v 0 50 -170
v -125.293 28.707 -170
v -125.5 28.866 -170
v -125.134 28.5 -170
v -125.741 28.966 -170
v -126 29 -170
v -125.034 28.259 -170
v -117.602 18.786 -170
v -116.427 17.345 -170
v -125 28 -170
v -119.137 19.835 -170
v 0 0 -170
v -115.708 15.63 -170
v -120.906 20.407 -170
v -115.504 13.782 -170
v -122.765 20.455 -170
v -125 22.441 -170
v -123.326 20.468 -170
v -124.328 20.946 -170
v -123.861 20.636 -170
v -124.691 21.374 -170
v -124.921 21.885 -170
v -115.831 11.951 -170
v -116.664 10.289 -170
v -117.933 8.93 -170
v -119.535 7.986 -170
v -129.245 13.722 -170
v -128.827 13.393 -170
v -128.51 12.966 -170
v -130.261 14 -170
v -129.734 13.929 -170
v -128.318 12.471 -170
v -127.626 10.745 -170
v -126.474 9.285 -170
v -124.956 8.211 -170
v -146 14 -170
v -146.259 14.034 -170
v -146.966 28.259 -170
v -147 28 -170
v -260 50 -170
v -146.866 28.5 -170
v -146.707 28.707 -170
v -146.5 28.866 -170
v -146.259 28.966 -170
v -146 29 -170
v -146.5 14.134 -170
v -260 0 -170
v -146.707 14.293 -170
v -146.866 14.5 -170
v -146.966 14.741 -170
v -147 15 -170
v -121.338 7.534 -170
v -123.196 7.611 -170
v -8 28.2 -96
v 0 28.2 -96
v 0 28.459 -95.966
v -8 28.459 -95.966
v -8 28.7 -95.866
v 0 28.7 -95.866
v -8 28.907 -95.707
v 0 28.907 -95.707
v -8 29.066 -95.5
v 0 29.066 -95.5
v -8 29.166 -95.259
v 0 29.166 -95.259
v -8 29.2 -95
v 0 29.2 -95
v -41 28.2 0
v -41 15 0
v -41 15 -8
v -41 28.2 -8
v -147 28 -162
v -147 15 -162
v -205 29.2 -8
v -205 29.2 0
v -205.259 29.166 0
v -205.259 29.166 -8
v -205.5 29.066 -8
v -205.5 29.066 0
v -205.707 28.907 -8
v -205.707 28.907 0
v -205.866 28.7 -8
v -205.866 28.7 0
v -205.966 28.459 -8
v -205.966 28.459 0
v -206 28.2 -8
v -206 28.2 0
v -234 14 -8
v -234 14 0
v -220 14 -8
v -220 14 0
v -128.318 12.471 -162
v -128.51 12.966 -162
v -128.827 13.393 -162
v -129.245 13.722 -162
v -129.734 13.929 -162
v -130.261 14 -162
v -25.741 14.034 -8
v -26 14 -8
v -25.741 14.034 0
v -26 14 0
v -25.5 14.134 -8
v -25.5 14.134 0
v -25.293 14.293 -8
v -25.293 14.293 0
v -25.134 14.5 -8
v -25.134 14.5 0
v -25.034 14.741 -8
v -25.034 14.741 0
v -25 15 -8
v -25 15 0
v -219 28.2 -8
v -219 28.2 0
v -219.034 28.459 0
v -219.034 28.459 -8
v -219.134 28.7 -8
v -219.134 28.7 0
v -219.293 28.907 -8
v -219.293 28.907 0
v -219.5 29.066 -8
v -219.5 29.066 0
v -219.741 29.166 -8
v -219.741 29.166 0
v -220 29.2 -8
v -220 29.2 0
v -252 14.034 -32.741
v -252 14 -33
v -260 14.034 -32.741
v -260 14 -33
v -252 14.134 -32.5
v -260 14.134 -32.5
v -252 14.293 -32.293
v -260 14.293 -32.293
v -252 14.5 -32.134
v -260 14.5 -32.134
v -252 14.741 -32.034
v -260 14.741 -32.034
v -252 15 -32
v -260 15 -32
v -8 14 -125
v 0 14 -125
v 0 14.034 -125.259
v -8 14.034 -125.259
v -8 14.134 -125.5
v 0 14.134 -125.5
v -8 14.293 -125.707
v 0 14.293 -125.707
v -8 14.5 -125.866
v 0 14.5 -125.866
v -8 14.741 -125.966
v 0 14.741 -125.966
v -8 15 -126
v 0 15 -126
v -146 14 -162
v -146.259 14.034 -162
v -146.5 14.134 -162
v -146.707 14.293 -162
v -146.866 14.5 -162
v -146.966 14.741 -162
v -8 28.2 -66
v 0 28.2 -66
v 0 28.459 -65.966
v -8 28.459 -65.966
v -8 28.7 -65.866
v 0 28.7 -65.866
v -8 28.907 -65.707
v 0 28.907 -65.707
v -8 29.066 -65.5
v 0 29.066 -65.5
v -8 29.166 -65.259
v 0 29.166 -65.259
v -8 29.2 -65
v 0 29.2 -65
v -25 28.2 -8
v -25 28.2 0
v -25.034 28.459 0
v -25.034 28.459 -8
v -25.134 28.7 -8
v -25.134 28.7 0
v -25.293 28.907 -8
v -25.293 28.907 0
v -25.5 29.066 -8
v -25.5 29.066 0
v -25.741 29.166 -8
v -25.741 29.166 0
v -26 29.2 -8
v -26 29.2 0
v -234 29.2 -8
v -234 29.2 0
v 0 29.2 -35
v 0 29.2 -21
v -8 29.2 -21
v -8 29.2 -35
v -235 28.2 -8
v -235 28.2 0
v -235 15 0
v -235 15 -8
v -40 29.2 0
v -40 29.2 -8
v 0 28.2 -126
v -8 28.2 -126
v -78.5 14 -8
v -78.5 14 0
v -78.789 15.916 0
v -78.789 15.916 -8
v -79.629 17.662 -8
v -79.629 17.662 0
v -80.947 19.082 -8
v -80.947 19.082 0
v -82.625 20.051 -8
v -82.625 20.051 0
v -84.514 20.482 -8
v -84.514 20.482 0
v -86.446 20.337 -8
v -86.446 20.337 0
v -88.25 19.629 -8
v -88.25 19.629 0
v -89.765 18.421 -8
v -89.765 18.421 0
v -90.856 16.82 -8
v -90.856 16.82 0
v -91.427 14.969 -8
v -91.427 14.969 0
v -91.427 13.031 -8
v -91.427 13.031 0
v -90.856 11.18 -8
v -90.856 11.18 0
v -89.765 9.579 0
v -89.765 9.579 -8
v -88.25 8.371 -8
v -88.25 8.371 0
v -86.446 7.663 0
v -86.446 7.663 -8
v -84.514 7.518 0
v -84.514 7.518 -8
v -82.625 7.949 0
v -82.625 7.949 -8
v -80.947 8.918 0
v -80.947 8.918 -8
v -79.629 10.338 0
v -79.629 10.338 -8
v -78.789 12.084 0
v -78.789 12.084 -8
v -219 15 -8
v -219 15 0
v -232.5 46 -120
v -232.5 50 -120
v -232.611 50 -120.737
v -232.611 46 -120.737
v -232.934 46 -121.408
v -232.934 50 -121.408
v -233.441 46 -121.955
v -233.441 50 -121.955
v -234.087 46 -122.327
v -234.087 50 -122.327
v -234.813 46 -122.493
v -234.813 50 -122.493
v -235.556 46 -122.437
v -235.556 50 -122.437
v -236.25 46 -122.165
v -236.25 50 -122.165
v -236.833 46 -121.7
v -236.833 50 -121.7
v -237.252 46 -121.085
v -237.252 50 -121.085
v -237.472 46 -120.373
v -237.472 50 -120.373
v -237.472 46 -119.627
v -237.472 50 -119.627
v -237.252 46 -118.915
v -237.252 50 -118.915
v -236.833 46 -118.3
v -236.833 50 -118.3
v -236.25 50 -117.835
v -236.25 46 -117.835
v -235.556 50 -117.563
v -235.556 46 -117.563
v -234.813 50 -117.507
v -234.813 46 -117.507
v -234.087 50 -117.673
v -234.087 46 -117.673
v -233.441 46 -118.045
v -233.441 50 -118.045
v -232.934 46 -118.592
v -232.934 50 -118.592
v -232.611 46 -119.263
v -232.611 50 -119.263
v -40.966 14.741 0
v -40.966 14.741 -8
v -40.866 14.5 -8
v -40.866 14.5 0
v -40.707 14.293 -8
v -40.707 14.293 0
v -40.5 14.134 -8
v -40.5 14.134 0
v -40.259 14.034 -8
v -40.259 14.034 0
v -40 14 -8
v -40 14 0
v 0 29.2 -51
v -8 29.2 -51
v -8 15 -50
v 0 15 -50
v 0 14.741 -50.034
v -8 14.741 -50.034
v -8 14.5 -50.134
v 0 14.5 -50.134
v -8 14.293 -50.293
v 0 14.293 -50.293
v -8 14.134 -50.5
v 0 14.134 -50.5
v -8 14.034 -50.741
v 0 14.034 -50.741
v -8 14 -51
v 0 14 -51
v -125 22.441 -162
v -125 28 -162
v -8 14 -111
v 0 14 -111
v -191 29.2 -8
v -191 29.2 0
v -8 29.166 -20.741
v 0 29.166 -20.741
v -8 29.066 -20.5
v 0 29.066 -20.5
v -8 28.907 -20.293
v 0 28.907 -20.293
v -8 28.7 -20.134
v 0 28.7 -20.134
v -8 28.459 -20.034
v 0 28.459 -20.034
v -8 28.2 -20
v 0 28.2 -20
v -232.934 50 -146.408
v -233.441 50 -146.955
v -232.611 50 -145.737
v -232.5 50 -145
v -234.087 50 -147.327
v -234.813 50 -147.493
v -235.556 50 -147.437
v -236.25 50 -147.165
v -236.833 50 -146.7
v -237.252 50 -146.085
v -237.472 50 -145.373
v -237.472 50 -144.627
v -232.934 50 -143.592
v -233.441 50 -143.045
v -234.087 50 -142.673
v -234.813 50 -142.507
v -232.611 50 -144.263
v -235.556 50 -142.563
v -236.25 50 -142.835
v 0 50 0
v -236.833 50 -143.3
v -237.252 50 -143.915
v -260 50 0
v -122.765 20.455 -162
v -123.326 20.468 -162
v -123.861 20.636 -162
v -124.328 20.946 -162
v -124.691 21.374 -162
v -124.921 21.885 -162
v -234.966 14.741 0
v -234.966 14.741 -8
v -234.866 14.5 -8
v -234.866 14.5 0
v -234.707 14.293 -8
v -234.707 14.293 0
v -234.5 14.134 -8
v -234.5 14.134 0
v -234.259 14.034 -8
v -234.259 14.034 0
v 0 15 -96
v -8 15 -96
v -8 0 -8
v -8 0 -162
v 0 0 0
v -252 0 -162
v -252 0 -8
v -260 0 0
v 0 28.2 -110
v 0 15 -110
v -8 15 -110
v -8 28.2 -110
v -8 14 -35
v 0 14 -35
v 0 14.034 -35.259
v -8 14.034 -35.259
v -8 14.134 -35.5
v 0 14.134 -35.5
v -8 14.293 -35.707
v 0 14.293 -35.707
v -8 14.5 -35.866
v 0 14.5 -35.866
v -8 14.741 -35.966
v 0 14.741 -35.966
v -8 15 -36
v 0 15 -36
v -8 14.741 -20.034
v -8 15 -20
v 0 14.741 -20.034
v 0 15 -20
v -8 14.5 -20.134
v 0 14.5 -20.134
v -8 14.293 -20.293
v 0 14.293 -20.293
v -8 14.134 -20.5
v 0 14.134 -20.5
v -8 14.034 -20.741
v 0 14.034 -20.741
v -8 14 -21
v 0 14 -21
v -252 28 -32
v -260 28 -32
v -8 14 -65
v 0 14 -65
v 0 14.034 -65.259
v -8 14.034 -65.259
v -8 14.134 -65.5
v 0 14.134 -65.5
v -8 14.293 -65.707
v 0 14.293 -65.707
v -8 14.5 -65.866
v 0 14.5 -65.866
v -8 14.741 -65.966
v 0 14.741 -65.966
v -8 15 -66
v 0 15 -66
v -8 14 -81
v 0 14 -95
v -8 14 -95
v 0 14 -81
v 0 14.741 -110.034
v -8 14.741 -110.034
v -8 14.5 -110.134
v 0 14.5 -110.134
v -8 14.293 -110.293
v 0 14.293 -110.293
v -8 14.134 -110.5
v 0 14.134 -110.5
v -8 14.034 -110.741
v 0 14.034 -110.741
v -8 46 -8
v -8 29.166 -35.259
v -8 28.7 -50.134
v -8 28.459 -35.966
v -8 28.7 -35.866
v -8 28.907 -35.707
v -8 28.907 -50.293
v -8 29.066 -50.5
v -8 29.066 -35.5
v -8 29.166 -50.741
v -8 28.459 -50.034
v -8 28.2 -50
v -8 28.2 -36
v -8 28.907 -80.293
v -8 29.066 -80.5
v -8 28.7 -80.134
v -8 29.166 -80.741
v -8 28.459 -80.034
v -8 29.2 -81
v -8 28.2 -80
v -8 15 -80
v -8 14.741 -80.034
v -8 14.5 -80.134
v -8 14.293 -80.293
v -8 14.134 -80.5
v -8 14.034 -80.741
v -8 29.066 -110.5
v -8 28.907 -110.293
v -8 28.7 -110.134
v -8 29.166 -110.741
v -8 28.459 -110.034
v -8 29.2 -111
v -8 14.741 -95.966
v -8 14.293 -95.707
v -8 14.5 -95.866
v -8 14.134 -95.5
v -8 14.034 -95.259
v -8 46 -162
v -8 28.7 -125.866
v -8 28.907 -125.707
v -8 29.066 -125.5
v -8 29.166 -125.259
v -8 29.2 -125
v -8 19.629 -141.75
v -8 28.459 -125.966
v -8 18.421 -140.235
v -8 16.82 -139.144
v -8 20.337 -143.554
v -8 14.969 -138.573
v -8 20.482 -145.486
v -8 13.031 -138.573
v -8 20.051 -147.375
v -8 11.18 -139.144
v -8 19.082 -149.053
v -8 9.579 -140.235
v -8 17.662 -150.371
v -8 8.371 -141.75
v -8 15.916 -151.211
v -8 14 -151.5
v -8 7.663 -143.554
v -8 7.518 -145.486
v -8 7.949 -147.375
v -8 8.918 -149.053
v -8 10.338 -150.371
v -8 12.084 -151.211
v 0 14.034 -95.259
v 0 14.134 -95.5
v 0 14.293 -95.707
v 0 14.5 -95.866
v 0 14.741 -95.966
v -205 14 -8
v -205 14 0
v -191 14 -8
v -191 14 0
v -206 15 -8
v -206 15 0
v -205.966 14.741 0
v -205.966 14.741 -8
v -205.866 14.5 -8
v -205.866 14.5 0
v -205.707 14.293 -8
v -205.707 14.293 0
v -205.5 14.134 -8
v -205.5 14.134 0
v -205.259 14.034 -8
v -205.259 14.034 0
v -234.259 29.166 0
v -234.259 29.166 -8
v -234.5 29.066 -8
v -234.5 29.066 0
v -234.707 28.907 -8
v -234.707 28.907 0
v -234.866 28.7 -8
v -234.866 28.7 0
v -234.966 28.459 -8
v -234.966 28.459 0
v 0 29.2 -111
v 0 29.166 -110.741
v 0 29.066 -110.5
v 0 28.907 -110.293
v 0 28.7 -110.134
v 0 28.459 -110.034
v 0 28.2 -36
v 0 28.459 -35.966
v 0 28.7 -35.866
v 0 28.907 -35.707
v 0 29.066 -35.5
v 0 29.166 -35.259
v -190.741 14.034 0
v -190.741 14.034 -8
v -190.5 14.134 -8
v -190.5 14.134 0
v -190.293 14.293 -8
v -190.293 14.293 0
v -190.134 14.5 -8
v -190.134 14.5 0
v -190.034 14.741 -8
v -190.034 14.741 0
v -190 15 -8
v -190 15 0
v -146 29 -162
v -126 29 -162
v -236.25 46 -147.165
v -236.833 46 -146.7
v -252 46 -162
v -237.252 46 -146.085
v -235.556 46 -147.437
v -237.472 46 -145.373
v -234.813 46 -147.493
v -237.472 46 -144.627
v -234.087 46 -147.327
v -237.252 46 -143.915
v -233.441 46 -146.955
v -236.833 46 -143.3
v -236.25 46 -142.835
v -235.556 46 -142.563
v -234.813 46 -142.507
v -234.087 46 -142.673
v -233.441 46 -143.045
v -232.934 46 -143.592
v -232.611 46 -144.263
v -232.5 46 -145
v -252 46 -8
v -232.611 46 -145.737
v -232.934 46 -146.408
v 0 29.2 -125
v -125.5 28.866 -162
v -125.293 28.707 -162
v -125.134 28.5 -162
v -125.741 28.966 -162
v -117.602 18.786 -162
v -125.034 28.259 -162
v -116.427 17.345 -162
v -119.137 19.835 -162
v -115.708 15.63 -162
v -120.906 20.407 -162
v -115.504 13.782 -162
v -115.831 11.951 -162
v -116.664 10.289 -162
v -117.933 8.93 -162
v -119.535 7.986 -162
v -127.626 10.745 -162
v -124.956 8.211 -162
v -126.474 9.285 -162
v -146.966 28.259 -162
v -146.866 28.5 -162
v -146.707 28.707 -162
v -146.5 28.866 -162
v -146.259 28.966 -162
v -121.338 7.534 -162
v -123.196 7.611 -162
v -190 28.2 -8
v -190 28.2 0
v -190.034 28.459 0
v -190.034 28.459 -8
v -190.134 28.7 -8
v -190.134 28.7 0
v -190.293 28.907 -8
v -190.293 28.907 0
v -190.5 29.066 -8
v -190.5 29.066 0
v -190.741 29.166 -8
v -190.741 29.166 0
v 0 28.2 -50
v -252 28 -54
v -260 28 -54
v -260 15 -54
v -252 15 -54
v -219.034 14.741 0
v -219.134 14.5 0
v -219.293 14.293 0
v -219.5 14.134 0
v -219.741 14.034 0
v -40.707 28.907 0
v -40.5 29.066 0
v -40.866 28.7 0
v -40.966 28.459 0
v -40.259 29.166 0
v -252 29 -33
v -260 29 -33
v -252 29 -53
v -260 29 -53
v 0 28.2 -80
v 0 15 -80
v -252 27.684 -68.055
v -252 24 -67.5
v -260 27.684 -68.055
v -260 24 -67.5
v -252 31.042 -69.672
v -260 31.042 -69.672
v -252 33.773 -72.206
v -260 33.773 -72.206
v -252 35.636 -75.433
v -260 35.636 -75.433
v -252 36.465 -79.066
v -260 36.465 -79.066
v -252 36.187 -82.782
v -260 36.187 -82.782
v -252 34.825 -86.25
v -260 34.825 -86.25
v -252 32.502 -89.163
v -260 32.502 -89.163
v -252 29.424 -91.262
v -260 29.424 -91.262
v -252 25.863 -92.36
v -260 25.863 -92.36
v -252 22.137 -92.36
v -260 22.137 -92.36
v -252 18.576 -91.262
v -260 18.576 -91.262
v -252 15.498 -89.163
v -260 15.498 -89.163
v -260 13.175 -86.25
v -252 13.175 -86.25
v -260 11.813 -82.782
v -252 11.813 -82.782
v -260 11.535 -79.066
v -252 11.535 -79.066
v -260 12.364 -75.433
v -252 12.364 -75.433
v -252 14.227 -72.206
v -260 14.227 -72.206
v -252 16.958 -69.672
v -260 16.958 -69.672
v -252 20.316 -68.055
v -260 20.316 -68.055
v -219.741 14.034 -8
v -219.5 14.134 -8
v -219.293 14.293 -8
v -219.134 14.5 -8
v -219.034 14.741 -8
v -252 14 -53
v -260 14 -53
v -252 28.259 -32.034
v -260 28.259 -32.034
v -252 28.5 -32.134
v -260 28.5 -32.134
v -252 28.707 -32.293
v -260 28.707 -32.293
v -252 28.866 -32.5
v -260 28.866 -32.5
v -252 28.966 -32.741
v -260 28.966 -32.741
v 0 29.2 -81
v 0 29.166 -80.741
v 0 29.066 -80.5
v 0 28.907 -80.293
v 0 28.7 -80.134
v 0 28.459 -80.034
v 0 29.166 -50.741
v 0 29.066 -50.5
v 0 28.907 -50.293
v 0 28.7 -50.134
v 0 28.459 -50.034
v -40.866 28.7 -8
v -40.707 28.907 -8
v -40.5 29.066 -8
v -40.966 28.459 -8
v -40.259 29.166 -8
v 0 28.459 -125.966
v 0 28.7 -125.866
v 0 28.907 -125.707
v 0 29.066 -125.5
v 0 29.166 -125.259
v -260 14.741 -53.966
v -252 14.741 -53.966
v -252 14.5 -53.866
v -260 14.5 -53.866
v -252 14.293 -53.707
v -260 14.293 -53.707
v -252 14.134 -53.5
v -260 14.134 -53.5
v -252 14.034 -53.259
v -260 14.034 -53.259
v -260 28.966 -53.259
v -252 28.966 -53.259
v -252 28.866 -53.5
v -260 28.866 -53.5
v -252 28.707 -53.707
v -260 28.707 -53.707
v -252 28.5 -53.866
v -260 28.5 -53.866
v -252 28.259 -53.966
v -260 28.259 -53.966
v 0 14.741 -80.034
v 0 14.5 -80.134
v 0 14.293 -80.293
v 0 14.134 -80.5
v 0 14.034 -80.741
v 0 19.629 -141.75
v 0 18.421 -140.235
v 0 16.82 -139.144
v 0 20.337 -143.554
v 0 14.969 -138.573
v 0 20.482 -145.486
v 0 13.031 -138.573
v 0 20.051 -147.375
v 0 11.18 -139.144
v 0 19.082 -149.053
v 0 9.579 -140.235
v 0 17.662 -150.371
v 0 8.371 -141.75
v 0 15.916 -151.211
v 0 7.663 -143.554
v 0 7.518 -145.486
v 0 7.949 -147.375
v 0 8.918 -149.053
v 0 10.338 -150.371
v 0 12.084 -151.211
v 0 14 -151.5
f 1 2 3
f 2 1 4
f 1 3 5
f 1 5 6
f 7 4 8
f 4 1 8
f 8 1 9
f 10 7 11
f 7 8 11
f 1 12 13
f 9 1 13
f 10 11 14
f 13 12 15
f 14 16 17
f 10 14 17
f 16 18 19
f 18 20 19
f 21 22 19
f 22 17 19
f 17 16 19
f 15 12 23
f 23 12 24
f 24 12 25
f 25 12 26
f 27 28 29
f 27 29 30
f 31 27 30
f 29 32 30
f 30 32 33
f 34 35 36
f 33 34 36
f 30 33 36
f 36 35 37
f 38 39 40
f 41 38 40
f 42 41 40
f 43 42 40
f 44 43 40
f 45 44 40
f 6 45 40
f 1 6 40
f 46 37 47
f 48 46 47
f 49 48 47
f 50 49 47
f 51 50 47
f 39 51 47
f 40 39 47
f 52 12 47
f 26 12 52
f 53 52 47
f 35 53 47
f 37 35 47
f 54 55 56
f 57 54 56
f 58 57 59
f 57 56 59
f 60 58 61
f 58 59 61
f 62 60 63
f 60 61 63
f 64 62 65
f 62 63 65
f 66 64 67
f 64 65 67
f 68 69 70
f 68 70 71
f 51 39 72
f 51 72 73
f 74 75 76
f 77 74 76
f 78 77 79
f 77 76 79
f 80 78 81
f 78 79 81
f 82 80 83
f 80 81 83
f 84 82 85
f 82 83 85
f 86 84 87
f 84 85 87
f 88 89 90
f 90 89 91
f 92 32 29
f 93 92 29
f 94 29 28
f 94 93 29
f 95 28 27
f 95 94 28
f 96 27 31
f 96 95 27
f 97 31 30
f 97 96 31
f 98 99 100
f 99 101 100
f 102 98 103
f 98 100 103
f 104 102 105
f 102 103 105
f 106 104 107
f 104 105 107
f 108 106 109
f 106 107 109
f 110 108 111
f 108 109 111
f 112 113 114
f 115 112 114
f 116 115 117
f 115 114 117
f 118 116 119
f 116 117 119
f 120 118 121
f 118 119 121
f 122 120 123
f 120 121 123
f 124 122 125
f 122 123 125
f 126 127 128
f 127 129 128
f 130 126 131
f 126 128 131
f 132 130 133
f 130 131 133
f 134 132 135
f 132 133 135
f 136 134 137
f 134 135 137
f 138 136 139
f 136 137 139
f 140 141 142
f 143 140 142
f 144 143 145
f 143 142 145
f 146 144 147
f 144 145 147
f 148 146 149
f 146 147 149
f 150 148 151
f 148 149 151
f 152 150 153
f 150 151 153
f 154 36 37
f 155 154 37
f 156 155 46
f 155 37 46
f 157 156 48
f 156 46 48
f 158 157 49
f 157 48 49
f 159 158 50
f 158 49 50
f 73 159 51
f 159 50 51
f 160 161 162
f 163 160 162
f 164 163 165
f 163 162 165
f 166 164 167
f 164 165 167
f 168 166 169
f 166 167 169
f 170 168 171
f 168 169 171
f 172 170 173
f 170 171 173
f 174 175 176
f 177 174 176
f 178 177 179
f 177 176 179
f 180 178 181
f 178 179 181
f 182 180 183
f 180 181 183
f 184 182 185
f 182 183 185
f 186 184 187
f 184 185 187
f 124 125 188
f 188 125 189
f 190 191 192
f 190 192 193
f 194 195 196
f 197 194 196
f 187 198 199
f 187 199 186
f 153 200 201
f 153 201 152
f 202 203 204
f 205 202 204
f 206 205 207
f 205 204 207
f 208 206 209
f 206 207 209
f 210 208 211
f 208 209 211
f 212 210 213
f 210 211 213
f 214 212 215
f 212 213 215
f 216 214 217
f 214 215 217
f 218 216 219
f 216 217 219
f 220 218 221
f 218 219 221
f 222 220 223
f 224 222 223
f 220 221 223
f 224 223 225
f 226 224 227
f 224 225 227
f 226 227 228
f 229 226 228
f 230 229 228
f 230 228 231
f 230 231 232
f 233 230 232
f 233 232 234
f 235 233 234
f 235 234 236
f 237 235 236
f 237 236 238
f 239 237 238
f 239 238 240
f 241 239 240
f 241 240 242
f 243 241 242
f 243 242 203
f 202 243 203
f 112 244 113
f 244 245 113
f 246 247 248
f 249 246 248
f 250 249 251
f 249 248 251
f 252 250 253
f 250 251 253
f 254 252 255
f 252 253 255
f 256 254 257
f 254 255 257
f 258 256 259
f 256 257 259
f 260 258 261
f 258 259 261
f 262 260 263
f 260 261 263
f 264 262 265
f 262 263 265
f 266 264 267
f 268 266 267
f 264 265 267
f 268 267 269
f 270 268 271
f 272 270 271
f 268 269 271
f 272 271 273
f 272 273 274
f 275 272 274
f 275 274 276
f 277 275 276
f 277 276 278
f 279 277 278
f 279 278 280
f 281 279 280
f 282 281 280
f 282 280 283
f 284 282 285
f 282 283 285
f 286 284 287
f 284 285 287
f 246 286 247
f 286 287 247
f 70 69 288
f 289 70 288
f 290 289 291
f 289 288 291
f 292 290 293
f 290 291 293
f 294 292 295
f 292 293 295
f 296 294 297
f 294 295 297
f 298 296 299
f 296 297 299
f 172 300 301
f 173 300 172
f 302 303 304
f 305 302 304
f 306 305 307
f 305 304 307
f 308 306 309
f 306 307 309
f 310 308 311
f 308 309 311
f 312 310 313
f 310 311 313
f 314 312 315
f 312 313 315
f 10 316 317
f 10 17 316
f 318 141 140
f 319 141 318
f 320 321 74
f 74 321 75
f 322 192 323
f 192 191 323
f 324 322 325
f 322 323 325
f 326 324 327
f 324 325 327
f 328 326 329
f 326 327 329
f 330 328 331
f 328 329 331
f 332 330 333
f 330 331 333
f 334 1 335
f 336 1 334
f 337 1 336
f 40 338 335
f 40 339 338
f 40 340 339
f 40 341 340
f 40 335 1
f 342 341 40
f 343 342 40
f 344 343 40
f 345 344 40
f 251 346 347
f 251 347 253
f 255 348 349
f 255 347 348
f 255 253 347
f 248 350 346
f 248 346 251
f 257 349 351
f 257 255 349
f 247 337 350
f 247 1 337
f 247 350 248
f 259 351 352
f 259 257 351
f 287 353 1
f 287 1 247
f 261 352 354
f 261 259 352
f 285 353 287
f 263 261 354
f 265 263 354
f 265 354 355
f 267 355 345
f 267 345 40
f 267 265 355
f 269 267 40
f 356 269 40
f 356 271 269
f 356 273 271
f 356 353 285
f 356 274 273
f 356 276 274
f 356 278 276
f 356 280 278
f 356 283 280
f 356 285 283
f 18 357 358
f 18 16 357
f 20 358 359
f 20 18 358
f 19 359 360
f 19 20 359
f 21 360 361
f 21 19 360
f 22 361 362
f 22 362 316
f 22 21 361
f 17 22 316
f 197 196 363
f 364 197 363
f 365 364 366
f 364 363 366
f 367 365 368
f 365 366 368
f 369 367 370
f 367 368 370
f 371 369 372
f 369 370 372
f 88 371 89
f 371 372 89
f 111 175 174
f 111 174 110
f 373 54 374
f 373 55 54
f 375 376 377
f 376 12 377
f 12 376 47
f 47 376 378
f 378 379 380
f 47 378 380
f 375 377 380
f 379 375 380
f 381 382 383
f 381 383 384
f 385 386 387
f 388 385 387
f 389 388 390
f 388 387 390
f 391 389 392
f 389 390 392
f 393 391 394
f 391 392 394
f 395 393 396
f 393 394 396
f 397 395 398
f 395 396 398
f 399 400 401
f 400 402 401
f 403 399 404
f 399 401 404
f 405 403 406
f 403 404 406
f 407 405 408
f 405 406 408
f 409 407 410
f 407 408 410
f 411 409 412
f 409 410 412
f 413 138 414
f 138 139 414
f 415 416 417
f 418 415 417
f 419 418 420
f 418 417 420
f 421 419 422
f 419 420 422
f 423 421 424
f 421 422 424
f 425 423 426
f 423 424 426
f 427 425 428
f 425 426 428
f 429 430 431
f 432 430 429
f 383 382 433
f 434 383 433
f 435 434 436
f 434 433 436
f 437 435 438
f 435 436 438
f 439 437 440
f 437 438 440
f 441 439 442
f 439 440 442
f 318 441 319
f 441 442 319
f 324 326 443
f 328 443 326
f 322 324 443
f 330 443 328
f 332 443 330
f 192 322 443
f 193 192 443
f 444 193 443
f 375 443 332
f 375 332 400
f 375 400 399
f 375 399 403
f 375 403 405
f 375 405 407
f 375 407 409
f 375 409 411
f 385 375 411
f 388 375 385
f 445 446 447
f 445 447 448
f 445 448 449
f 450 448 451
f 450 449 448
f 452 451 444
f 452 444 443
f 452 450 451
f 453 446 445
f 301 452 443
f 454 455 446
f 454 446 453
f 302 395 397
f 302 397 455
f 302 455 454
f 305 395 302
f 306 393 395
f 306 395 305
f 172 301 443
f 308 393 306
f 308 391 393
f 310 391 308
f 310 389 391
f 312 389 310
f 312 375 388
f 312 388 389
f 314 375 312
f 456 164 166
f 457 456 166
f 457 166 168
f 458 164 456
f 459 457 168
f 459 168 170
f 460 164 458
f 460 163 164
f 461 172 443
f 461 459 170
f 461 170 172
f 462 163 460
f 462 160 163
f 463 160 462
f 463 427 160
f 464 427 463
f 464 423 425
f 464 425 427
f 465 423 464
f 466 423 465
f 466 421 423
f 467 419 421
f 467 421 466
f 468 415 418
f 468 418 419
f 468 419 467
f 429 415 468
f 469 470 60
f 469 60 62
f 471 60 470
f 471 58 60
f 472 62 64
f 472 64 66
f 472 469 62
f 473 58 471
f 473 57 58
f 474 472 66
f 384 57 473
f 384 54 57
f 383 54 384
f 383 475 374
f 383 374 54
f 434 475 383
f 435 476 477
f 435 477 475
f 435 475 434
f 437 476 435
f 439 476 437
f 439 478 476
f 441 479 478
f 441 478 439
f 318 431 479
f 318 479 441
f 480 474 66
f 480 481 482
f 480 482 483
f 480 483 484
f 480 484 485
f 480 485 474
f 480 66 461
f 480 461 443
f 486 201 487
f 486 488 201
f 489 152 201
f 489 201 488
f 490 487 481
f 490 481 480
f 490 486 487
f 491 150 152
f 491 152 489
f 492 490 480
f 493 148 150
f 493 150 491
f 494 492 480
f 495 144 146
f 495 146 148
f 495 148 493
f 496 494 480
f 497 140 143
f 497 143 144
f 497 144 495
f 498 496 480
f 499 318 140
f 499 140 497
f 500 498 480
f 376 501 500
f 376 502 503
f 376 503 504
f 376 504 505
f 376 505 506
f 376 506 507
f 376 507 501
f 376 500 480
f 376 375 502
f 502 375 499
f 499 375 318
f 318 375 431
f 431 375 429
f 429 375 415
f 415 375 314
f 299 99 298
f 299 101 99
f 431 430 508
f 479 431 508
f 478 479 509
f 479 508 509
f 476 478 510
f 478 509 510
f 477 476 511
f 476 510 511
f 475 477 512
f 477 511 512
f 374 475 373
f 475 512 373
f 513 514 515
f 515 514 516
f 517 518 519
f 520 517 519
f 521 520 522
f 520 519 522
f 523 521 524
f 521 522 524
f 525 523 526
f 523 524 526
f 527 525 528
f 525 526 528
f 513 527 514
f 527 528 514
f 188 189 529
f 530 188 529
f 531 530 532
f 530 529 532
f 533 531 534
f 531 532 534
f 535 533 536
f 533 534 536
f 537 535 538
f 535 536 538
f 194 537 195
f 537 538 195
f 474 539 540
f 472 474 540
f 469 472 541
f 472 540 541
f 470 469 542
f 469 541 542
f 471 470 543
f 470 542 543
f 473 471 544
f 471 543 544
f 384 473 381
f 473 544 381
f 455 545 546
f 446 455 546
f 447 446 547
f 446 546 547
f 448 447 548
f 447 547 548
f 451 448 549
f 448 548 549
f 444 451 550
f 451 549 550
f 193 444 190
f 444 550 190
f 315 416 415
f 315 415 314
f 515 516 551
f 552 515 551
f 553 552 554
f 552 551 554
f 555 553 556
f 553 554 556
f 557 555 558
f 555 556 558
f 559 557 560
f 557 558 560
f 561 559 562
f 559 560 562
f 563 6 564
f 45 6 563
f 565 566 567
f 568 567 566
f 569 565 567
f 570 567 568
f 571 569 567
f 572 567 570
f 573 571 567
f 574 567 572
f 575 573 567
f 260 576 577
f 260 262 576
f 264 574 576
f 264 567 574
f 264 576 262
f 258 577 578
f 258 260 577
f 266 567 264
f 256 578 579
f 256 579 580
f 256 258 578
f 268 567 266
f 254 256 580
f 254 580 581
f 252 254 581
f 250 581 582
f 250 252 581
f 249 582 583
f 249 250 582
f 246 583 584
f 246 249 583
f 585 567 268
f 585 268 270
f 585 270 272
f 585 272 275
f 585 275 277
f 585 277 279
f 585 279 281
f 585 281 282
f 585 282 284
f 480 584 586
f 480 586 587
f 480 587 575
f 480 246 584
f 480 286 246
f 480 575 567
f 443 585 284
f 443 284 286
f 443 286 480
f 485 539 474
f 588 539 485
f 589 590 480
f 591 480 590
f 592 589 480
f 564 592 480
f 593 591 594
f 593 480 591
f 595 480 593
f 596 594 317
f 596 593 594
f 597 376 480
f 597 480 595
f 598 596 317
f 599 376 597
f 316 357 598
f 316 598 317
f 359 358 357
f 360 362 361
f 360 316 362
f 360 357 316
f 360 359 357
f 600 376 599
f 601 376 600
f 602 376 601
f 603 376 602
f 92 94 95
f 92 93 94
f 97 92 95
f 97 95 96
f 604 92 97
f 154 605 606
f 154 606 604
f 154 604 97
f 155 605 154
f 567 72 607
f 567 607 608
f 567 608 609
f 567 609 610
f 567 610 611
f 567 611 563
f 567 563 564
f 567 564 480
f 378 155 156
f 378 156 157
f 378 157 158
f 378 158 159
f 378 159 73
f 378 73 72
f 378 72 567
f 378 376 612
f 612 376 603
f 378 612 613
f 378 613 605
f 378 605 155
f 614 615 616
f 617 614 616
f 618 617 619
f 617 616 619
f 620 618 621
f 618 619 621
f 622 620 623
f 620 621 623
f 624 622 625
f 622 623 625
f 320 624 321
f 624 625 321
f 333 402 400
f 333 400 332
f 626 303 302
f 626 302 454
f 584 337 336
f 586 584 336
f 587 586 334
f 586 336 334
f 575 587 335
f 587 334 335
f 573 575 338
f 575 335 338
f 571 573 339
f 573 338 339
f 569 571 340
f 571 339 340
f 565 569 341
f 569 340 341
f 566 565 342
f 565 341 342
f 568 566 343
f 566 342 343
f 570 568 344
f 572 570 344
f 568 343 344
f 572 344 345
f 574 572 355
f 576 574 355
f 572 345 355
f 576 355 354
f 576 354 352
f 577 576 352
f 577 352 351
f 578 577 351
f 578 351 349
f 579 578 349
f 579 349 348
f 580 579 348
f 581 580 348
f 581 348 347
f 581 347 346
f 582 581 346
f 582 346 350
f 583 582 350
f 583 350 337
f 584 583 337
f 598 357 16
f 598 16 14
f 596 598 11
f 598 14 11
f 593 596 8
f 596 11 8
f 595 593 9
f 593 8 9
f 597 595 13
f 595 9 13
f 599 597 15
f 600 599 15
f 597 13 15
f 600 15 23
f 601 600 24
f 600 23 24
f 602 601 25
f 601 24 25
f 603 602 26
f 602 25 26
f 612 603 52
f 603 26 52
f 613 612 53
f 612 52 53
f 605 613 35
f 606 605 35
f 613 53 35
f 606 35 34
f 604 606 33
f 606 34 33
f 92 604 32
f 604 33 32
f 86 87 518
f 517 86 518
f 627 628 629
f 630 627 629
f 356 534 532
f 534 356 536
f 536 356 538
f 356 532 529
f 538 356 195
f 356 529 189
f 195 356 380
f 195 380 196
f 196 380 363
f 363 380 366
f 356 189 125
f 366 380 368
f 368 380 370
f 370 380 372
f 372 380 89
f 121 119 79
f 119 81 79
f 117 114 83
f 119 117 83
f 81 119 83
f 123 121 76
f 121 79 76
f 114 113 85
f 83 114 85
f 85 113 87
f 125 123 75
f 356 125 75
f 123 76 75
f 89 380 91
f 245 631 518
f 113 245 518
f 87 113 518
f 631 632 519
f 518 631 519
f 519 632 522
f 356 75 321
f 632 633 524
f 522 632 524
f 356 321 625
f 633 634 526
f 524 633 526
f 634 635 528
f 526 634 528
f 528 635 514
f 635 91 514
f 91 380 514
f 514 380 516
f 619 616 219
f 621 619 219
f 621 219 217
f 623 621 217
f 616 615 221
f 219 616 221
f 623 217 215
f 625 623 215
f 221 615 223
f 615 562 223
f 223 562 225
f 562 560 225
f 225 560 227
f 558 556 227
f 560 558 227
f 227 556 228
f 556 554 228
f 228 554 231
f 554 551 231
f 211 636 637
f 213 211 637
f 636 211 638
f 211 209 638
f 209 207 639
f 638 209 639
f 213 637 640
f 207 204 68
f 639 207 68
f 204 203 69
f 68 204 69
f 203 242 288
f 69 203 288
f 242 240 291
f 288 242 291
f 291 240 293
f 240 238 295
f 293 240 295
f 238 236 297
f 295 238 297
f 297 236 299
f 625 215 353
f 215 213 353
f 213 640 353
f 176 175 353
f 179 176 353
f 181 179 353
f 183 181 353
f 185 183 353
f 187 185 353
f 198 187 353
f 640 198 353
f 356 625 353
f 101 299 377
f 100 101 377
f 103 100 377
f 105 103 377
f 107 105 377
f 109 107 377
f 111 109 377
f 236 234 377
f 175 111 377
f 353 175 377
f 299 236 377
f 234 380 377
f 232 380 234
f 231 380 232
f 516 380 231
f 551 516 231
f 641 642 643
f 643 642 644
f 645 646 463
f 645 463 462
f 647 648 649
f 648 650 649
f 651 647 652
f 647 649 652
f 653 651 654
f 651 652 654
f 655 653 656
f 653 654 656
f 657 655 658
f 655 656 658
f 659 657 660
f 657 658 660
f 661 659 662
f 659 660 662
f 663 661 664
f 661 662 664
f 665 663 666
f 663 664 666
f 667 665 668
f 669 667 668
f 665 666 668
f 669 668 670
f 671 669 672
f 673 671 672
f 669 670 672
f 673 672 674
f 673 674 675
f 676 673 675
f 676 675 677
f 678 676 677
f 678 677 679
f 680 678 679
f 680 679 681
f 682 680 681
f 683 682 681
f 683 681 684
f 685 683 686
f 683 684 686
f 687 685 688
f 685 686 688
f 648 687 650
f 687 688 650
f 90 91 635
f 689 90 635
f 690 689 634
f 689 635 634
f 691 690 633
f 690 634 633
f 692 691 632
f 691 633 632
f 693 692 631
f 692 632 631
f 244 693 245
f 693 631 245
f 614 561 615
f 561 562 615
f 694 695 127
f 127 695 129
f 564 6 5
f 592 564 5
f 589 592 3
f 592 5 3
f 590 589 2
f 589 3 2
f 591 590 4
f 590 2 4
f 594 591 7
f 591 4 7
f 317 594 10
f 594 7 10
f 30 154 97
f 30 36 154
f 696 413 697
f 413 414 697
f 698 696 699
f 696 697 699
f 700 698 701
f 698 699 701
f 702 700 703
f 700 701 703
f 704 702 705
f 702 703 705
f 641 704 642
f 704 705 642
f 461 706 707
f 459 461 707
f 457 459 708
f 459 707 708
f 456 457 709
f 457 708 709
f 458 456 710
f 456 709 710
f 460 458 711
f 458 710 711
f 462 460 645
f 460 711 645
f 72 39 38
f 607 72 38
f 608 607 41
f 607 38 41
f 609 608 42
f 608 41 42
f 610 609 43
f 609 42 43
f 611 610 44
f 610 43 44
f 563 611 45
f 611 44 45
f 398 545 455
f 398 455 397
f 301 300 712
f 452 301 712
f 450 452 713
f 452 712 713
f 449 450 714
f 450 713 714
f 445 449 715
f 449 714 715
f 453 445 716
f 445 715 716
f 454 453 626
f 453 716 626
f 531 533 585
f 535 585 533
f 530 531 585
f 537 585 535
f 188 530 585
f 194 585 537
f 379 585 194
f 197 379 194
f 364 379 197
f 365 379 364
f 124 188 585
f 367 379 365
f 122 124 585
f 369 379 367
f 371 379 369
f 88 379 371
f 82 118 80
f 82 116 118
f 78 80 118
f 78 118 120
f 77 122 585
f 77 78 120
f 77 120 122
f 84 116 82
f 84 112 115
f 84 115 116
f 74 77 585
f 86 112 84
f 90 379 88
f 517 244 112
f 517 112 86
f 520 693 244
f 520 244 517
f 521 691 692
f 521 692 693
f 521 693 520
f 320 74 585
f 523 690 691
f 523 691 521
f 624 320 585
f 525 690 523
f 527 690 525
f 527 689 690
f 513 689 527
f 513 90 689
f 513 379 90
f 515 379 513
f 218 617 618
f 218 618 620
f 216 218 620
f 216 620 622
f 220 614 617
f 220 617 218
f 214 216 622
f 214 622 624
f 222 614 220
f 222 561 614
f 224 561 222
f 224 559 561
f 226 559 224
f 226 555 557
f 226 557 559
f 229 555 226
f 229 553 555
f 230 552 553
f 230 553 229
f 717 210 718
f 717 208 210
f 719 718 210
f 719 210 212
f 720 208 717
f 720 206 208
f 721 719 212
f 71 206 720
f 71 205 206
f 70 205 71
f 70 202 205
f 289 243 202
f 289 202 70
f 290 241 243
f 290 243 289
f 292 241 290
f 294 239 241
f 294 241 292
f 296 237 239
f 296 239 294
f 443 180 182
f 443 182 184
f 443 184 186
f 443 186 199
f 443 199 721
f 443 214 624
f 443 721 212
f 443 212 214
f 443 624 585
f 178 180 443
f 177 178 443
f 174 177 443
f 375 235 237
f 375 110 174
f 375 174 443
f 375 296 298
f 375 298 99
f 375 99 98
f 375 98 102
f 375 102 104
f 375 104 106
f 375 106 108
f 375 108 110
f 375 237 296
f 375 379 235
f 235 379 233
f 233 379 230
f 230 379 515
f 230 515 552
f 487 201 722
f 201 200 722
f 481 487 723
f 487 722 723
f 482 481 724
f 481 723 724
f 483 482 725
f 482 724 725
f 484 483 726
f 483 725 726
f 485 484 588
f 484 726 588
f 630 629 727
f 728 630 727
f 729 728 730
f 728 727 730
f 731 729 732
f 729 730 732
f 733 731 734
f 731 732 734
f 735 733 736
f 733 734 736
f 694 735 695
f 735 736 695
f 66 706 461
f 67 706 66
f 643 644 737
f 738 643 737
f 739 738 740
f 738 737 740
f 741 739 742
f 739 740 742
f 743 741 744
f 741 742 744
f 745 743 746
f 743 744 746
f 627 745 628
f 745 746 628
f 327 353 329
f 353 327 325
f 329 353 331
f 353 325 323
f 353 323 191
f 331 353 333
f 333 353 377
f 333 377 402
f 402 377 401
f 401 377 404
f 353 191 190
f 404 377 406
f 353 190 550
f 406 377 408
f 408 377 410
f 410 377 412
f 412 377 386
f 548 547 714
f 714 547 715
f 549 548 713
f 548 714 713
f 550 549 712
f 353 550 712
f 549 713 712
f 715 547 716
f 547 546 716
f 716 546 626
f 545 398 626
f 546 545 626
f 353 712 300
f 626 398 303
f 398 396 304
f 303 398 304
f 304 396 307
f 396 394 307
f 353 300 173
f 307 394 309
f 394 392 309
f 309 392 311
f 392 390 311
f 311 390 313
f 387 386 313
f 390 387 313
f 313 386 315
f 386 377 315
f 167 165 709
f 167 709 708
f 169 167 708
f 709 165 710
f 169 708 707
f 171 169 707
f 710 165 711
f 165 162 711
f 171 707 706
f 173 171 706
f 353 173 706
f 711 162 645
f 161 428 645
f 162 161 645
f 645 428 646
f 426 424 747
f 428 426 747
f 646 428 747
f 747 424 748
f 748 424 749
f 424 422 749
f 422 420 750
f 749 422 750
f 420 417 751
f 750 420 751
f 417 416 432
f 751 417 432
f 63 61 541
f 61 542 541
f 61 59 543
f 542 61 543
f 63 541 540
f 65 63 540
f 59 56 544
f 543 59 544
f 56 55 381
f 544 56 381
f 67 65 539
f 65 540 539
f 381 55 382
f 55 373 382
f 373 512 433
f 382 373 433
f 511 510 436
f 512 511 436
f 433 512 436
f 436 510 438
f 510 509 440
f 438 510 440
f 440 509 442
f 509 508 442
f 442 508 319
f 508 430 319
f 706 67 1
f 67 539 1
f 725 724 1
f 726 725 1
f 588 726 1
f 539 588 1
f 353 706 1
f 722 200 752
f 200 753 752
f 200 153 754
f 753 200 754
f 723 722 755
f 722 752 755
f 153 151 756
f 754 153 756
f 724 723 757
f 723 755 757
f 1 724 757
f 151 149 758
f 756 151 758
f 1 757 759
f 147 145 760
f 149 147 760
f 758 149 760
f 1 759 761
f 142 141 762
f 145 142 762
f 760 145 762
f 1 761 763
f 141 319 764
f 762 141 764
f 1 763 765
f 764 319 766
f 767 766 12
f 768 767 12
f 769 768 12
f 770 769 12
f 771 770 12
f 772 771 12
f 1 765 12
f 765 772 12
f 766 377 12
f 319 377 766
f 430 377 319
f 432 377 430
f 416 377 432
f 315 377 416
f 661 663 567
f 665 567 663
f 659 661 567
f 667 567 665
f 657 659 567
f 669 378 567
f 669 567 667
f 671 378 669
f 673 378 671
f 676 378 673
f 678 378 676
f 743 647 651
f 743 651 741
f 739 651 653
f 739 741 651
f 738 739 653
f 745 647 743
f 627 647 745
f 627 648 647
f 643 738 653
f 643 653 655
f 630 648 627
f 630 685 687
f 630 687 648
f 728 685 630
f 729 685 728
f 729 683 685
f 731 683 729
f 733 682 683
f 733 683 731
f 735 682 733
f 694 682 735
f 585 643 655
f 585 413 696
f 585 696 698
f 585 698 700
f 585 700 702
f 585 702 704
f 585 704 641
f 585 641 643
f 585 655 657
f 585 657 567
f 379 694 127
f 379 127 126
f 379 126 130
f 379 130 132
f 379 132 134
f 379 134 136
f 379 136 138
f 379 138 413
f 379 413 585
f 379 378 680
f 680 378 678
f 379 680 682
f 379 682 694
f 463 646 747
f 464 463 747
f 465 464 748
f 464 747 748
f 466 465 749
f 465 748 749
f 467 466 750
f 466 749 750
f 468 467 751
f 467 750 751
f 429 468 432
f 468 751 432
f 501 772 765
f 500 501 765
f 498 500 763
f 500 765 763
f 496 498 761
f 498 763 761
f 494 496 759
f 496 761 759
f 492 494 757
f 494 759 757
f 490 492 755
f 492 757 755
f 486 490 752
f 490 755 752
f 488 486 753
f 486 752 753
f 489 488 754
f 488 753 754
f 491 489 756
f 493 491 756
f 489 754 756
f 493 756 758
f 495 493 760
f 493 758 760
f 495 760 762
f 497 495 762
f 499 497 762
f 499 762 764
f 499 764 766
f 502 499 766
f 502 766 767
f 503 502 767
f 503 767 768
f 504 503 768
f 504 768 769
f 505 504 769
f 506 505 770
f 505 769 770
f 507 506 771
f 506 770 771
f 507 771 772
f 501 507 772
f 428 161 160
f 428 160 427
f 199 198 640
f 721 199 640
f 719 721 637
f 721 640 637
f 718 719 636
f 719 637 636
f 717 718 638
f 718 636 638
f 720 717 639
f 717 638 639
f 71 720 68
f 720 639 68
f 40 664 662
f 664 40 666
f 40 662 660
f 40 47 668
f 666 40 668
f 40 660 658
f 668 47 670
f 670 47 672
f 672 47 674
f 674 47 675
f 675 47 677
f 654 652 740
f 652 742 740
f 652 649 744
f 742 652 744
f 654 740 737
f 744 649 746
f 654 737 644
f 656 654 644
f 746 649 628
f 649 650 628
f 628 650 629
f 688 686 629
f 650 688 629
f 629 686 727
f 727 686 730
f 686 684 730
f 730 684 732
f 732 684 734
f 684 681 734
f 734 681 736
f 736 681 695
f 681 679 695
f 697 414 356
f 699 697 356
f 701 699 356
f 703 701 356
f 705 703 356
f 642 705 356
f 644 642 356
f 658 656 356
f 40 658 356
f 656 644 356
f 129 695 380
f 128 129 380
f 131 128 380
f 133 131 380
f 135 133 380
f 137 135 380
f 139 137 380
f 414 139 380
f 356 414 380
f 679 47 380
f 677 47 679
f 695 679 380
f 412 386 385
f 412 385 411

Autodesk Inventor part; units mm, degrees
ref_plane "YZ Plane" through (0, 0, 0) normal (1, 0, 0) x (0, 1, 0)
ref_plane "XZ Plane" through (0, 0, 0) normal (0, 1, 0) x (-1, 0, 0)
ref_plane "XY Plane" through (0, 0, 0) normal (0, 0, 1) x (1, 0, 0)
sketch "Sketch1" plane through (0, 0, 0) normal (0, 1, 0) x (-1, 0, 0)
  line L0 (0, -170) -> (260, -170)
  line L1 (260, -170) -> (260, 0)
  line L2 (260, 0) -> (0, 0)
  line L3 (0, 0) -> (0, -170)
  dimension "d2" = 260
  dimension "d3" = 170
extrude "Box" add sketch "Sketch1" along normal blind 50
sketch "Sketch2" plane through (0, 0, 0) normal (1, 0, 0) x (0, 0, -1)
  line L0 (35, 14) -> (21, 14)
  line L1 (20, 15) -> (20, 28.2)
  line L2 (21, 29.2) -> (35, 29.2)
  line L3 (36, 28.2) -> (36, 15)
  arc A0 (21, 29.2) -> (20, 28.2) centre (21, 28.2) ccw
  arc A1 (36, 28.2) -> (35, 29.2) centre (35, 28.2) ccw
  arc A2 (35, 14) -> (36, 15) centre (35, 15) ccw
  arc A3 (20, 15) -> (21, 14) centre (21, 15) ccw
  line L4 (65, 14) -> (51, 14)
  line L5 (50, 15) -> (50, 28.2)
  line L6 (51, 29.2) -> (65, 29.2)
  line L7 (66, 28.2) -> (66, 15)
  arc A4 (51, 29.2) -> (50, 28.2) centre (51, 28.2) ccw
  arc A5 (66, 28.2) -> (65, 29.2) centre (65, 28.2) ccw
  arc A6 (65, 14) -> (66, 15) centre (65, 15) ccw
  arc A7 (50, 15) -> (51, 14) centre (51, 15) ccw
  line L8 (95, 14) -> (81, 14)
  line L9 (80, 15) -> (80, 28.2)
  line L10 (81, 29.2) -> (95, 29.2)
  line L11 (96, 28.2) -> (96, 15)
  arc A8 (81, 29.2) -> (80, 28.2) centre (81, 28.2) ccw
  arc A9 (96, 28.2) -> (95, 29.2) centre (95, 28.2) ccw
  arc A10 (95, 14) -> (96, 15) centre (95, 15) ccw
  arc A11 (80, 15) -> (81, 14) centre (81, 15) ccw
  line L12 (125, 14) -> (111, 14)
  line L13 (110, 15) -> (110, 28.2)
  line L14 (111, 29.2) -> (125, 29.2)
  line L15 (126, 28.2) -> (126, 15)
  arc A12 (111, 29.2) -> (110, 28.2) centre (111, 28.2) ccw
  arc A13 (126, 28.2) -> (125, 29.2) centre (125, 28.2) ccw
  arc A14 (125, 14) -> (126, 15) centre (125, 15) ccw
  arc A15 (110, 15) -> (111, 14) centre (111, 15) ccw
  line L16 (0, 0) -> (0, 50) construction
  line L17 (0, 0) -> (170, 0) construction
  point P0 (36, 14)
  point P1 (20, 29.2)
  point P2 (20, 14)
  point P3 (36, 29.2)
  point P4 (66, 14)
  point P5 (50, 29.2)
  point P6 (50, 14)
  point P7 (66, 29.2)
  point P8 (96, 14)
  point P9 (80, 29.2)
  point P10 (80, 14)
  point P11 (96, 29.2)
  point P12 (126, 14)
  point P13 (110, 29.2)
  point P14 (110, 14)
  point P15 (126, 29.2)
  point P16 (20, 21.6)
  point P17 (28, 29.2)
  dimension "d6" = 16
  dimension "d72" = 1
  dimension "d73" = 16
  dimension "d75" = 1
  dimension "d76" = 16
  dimension "d78" = 1
  dimension "d79" = 16
  dimension "d81" = 1
  dimension "d82" = 14
  dimension "d83" = 20
  dimension "d84" = 30
  dimension "d87" = 30
  dimension "d88" = 30
  dimension "d110" = 15.2
extrude "Ethernet" cut sketch "Sketch2" against normal blind 20
sketch "Sketch6" plane through (-260, 0, 0) normal (0, 0, 1) x (1, 0, 0)
  line L0 (40, 29.2) -> (26, 29.2)
  line L1 (25, 28.2) -> (25, 15)
  line L2 (26, 14) -> (40, 14)
  line L3 (41, 15) -> (41, 28.2)
  line L4 (0, 0) -> (0, 50) projected
  line L5 (0, 0) -> (260, 0) projected
  arc A0 (26, 29.2) -> (25, 28.2) centre (26, 28.2) ccw
  arc A1 (41, 28.2) -> (40, 29.2) centre (40, 28.2) ccw
  arc A2 (40, 14) -> (41, 15) centre (40, 15) ccw
  arc A3 (25, 15) -> (26, 14) centre (26, 15) ccw
  line L6 (69, 29.2) -> (55, 29.2)
  line L7 (54, 28.2) -> (54, 15)
  line L8 (55, 14) -> (69, 14)
  line L9 (70, 15) -> (70, 28.2)
  arc A4 (55, 29.2) -> (54, 28.2) centre (55, 28.2) ccw
  arc A5 (70, 28.2) -> (69, 29.2) centre (69, 28.2) ccw
  arc A6 (69, 14) -> (70, 15) centre (69, 15) ccw
  arc A7 (54, 15) -> (55, 14) centre (55, 15) ccw
  point P0 (41, 29.2)
  point P1 (25, 14)
  point P2 (25, 29.2)
  point P3 (41, 14)
  point P4 (70, 29.2)
  point P5 (54, 14)
  point P6 (54, 29.2)
  point P7 (70, 14)
  dimension "d22" = 16
  dimension "d23" = 15.2
  dimension "d92" = 25
  dimension "d93" = 14
  dimension "d94" = 1
  dimension "d95" = 16
  dimension "d97" = 1
  dimension "d99" = 13
extrude "Rotary-Ethernet" cut sketch "Sketch6" against normal blind 20
sketch "Sketch9" plane through (0, 50, 0) normal (0, 1, 0) x (1, 0, 0)
  circle A0 centre (-235, 120) radius 2.5
  line L0 (-260, 170) -> (-260, 0) construction
  line L1 (0, 170) -> (-260, 170) construction
  circle A1 centre (-235, 145) radius 2.5
  point P0 (0, 0)
  dimension "d33" = 5
  dimension "d68" = 25
  dimension "d69" = 50
  dimension "d70" = 25
  dimension "d71" = 25
extrude "Spout1" cut sketch "Sketch9" against normal blind 20
sketch "Sketch11" plane through (0, 0, -170) normal (0, 0, -1) x (-1, 0, 0)
  line L0 (146, 14) -> (126, 14)
  line L1 (125, 15) -> (125, 28)
  line L2 (126, 29) -> (146, 29)
  line L3 (147, 28) -> (147, 15)
  line L4 (0, 0) -> (260, 0) projected
  line L5 (0, 0) -> (0, 50) projected
  arc A0 (126, 29) -> (125, 28) centre (126, 28) ccw
  arc A1 (147, 28) -> (146, 29) centre (146, 28) ccw
  arc A2 (146, 14) -> (147, 15) centre (146, 15) ccw
  arc A3 (125, 15) -> (126, 14) centre (126, 15) ccw
  point P0 (0, 0)
  point P1 (147, 14)
  point P2 (125, 29)
  point P3 (125, 14)
  point P4 (147, 29)
  dimension "d39" = 22
  dimension "d40" = 15
  dimension "d105" = 14
  dimension "d106" = 125
  dimension "d107" = 1
extrude "Teensy usb" cut sketch "Sketch11" against normal blind 10
sketch "Sketch13" plane through (-260, 0, 0) normal (0, 0, 1) x (1, 0, 0)
  line L0 (220, 29.2) -> (234, 29.2)
  line L1 (235, 28.2) -> (235, 15)
  line L2 (234, 14) -> (220, 14)
  line L3 (219, 15) -> (219, 28.2)
  line L4 (260, 0) -> (260, 50) projected
  line L5 (0, 0) -> (260, 0) projected
  arc A0 (220, 29.2) -> (219, 28.2) centre (220, 28.2) ccw
  arc A1 (235, 28.2) -> (234, 29.2) centre (234, 28.2) ccw
  arc A2 (234, 14) -> (235, 15) centre (234, 15) ccw
  arc A3 (219, 15) -> (220, 14) centre (220, 15) ccw
  point P0 (219, 29.2)
  point P1 (235, 14)
  point P2 (235, 29.2)
  point P3 (219, 14)
  dimension "d43" = 16
  dimension "d44" = 15.2
  dimension "d89" = 25
  dimension "d90" = 14
  dimension "d91" = 1
extrude "Teensy shield" cut sketch "Sketch13" against normal blind 10
sketch "power 5 v" plane through (0, 0, -170) normal (0, 0, -1) x (-1, 0, 0)
  circle A0 centre (122, 14) radius 6.5
  line L0 (0, 0) -> (260, 0) projected
  line L1 (146, 14) -> (126, 14) projected
  point P0 (136, 14)
  dimension "d47" = 13
  dimension "d108" = 14
  dimension "d109" = 14
extrude "Power5" cut sketch "power 5 v" against normal blind 20
sketch "power9" plane through (0, 0, 0) normal (1, 0, 0) x (0, 0, -1)
  circle A0 centre (145, 14) radius 6.5
  line L0 (0, 0) -> (170, 0) projected
  line L1 (170, 0) -> (170, 50) projected
  dimension "d50" = 13
  dimension "d85" = 14
  dimension "d86" = 25
extrude "Power 9" cut sketch "power9" against normal blind 20
sketch "Power121" plane through (-260, 0, 0) normal (0, 0, 1) x (1, 0, 0)
  circle A0 centre (175, 14) radius 6.5
  line L0 (0, 0) -> (260, 0) projected
  arc A1 (234, 14) -> (235, 15) centre (234, 15) ccw projected
  line L1 (234, 14) -> (220, 14) projected
  arc A2 (219, 15) -> (220, 14) centre (220, 15) ccw projected
  line L2 (219, 15) -> (219, 28.2) projected
  arc A3 (220, 29.2) -> (219, 28.2) centre (220, 28.2) ccw projected
  line L3 (220, 29.2) -> (234, 29.2) projected
  arc A4 (235, 28.2) -> (234, 29.2) centre (234, 28.2) ccw projected
  line L4 (235, 28.2) -> (235, 15) projected
  line L5 (25, 15) -> (25, 28.2) projected
  arc A5 (26, 29.2) -> (25, 28.2) centre (26, 28.2) ccw projected
  line L6 (26, 29.2) -> (40, 29.2) projected
  arc A6 (41, 28.2) -> (40, 29.2) centre (40, 28.2) ccw projected
  line L7 (41, 28.2) -> (41, 15) projected
  arc A7 (40, 14) -> (41, 15) centre (40, 15) ccw projected
  line L8 (40, 14) -> (26, 14) projected
  arc A8 (25, 15) -> (26, 14) centre (26, 15) ccw projected
  arc A9 (55, 29.2) -> (54, 28.2) centre (55, 28.2) ccw projected
  line L9 (55, 29.2) -> (69, 29.2) projected
  arc A10 (70, 28.2) -> (69, 29.2) centre (69, 28.2) ccw projected
  line L10 (70, 28.2) -> (70, 15) projected
  arc A11 (69, 14) -> (70, 15) centre (69, 15) ccw projected
  line L11 (69, 14) -> (55, 14) projected
  arc A12 (54, 15) -> (55, 14) centre (55, 15) ccw projected
  line L12 (54, 15) -> (54, 28.2) projected
  line L13 (0, 0) -> (260, 0) projected
  line L14 (260, 0) -> (260, 50) projected
  line L15 (0, 50) -> (260, 50) projected
  line L16 (0, 0) -> (0, 50) projected
  dimension "d53" = 13
  dimension "d100" = 14
  dimension "d101" = 85
extrude "Power12" cut sketch "Power121" against normal blind 20 contours A0
sketch "Rotary USB1" plane through (-260, 0, -170) normal (-1, 0, 0) x (0, 0, 1)
  line L0 (137, 29) -> (117, 29)
  line L1 (116, 28) -> (116, 15)
  line L2 (117, 14) -> (137, 14)
  line L3 (138, 15) -> (138, 28)
  line L4 (0, 0) -> (170, 0) projected
  line L5 (170, 0) -> (170, 50) projected
  arc A0 (138, 28) -> (137, 29) centre (137, 28) ccw
  arc A1 (137, 14) -> (138, 15) centre (137, 15) ccw
  arc A2 (116, 15) -> (117, 14) centre (117, 15) ccw
  arc A3 (117, 29) -> (116, 28) centre (117, 28) ccw
  point P0 (170, 0)
  point P1 (138, 29)
  point P2 (116, 14)
  point P3 (116, 29)
  point P4 (138, 14)
  dimension "d58" = 22
  dimension "d59" = 15
  dimension "d102" = 14
  dimension "d103" = 32
  dimension "d104" = 1
extrude "Rotary USB" cut sketch "Rotary USB1" against normal blind 20
sketch "Sketch19" plane through (0, 0, 0) normal (0, -1, 0) x (1, 0, 0)
  line L0 (-260, -170) -> (-260, 0) construction
  line L1 (0, -170) -> (-260, -170) construction
  line L2 (0, 0) -> (0, -170) construction
  line L3 (-260, 0) -> (0, 0) construction
  line L4 (-8, -162) -> (-252, -162)
  line L5 (-252, -162) -> (-252, -8)
  line L6 (-252, -8) -> (-8, -8)
  line L7 (-8, -8) -> (-8, -162)
  dimension "d62" = 8
  dimension "d63" = 8
  dimension "d64" = 8
  dimension "d65" = 8
extrude "Extrusion17" cut sketch "Sketch19" against normal blind 46
fillet "Fillet1" radius 2 2 edges at (-128.5, 14, -166) (-125, 19.7663, -166)
sketch "Sketch20" plane through (-260, 0, -170) normal (-1, 0, 0) x (0, 0, 1)
  circle A0 centre (90, 24) radius 12.5
  line L0 (0, 0) -> (170, 0) projected
  line L1 (0, 0) -> (0, 50) projected
  dimension "d112" = 25
  dimension "d113" = 24
  dimension "d114" = 90
extrude "Extrusion18" cut sketch "Sketch20" against normal blind 20
properties part number "TouchShakerBox"
